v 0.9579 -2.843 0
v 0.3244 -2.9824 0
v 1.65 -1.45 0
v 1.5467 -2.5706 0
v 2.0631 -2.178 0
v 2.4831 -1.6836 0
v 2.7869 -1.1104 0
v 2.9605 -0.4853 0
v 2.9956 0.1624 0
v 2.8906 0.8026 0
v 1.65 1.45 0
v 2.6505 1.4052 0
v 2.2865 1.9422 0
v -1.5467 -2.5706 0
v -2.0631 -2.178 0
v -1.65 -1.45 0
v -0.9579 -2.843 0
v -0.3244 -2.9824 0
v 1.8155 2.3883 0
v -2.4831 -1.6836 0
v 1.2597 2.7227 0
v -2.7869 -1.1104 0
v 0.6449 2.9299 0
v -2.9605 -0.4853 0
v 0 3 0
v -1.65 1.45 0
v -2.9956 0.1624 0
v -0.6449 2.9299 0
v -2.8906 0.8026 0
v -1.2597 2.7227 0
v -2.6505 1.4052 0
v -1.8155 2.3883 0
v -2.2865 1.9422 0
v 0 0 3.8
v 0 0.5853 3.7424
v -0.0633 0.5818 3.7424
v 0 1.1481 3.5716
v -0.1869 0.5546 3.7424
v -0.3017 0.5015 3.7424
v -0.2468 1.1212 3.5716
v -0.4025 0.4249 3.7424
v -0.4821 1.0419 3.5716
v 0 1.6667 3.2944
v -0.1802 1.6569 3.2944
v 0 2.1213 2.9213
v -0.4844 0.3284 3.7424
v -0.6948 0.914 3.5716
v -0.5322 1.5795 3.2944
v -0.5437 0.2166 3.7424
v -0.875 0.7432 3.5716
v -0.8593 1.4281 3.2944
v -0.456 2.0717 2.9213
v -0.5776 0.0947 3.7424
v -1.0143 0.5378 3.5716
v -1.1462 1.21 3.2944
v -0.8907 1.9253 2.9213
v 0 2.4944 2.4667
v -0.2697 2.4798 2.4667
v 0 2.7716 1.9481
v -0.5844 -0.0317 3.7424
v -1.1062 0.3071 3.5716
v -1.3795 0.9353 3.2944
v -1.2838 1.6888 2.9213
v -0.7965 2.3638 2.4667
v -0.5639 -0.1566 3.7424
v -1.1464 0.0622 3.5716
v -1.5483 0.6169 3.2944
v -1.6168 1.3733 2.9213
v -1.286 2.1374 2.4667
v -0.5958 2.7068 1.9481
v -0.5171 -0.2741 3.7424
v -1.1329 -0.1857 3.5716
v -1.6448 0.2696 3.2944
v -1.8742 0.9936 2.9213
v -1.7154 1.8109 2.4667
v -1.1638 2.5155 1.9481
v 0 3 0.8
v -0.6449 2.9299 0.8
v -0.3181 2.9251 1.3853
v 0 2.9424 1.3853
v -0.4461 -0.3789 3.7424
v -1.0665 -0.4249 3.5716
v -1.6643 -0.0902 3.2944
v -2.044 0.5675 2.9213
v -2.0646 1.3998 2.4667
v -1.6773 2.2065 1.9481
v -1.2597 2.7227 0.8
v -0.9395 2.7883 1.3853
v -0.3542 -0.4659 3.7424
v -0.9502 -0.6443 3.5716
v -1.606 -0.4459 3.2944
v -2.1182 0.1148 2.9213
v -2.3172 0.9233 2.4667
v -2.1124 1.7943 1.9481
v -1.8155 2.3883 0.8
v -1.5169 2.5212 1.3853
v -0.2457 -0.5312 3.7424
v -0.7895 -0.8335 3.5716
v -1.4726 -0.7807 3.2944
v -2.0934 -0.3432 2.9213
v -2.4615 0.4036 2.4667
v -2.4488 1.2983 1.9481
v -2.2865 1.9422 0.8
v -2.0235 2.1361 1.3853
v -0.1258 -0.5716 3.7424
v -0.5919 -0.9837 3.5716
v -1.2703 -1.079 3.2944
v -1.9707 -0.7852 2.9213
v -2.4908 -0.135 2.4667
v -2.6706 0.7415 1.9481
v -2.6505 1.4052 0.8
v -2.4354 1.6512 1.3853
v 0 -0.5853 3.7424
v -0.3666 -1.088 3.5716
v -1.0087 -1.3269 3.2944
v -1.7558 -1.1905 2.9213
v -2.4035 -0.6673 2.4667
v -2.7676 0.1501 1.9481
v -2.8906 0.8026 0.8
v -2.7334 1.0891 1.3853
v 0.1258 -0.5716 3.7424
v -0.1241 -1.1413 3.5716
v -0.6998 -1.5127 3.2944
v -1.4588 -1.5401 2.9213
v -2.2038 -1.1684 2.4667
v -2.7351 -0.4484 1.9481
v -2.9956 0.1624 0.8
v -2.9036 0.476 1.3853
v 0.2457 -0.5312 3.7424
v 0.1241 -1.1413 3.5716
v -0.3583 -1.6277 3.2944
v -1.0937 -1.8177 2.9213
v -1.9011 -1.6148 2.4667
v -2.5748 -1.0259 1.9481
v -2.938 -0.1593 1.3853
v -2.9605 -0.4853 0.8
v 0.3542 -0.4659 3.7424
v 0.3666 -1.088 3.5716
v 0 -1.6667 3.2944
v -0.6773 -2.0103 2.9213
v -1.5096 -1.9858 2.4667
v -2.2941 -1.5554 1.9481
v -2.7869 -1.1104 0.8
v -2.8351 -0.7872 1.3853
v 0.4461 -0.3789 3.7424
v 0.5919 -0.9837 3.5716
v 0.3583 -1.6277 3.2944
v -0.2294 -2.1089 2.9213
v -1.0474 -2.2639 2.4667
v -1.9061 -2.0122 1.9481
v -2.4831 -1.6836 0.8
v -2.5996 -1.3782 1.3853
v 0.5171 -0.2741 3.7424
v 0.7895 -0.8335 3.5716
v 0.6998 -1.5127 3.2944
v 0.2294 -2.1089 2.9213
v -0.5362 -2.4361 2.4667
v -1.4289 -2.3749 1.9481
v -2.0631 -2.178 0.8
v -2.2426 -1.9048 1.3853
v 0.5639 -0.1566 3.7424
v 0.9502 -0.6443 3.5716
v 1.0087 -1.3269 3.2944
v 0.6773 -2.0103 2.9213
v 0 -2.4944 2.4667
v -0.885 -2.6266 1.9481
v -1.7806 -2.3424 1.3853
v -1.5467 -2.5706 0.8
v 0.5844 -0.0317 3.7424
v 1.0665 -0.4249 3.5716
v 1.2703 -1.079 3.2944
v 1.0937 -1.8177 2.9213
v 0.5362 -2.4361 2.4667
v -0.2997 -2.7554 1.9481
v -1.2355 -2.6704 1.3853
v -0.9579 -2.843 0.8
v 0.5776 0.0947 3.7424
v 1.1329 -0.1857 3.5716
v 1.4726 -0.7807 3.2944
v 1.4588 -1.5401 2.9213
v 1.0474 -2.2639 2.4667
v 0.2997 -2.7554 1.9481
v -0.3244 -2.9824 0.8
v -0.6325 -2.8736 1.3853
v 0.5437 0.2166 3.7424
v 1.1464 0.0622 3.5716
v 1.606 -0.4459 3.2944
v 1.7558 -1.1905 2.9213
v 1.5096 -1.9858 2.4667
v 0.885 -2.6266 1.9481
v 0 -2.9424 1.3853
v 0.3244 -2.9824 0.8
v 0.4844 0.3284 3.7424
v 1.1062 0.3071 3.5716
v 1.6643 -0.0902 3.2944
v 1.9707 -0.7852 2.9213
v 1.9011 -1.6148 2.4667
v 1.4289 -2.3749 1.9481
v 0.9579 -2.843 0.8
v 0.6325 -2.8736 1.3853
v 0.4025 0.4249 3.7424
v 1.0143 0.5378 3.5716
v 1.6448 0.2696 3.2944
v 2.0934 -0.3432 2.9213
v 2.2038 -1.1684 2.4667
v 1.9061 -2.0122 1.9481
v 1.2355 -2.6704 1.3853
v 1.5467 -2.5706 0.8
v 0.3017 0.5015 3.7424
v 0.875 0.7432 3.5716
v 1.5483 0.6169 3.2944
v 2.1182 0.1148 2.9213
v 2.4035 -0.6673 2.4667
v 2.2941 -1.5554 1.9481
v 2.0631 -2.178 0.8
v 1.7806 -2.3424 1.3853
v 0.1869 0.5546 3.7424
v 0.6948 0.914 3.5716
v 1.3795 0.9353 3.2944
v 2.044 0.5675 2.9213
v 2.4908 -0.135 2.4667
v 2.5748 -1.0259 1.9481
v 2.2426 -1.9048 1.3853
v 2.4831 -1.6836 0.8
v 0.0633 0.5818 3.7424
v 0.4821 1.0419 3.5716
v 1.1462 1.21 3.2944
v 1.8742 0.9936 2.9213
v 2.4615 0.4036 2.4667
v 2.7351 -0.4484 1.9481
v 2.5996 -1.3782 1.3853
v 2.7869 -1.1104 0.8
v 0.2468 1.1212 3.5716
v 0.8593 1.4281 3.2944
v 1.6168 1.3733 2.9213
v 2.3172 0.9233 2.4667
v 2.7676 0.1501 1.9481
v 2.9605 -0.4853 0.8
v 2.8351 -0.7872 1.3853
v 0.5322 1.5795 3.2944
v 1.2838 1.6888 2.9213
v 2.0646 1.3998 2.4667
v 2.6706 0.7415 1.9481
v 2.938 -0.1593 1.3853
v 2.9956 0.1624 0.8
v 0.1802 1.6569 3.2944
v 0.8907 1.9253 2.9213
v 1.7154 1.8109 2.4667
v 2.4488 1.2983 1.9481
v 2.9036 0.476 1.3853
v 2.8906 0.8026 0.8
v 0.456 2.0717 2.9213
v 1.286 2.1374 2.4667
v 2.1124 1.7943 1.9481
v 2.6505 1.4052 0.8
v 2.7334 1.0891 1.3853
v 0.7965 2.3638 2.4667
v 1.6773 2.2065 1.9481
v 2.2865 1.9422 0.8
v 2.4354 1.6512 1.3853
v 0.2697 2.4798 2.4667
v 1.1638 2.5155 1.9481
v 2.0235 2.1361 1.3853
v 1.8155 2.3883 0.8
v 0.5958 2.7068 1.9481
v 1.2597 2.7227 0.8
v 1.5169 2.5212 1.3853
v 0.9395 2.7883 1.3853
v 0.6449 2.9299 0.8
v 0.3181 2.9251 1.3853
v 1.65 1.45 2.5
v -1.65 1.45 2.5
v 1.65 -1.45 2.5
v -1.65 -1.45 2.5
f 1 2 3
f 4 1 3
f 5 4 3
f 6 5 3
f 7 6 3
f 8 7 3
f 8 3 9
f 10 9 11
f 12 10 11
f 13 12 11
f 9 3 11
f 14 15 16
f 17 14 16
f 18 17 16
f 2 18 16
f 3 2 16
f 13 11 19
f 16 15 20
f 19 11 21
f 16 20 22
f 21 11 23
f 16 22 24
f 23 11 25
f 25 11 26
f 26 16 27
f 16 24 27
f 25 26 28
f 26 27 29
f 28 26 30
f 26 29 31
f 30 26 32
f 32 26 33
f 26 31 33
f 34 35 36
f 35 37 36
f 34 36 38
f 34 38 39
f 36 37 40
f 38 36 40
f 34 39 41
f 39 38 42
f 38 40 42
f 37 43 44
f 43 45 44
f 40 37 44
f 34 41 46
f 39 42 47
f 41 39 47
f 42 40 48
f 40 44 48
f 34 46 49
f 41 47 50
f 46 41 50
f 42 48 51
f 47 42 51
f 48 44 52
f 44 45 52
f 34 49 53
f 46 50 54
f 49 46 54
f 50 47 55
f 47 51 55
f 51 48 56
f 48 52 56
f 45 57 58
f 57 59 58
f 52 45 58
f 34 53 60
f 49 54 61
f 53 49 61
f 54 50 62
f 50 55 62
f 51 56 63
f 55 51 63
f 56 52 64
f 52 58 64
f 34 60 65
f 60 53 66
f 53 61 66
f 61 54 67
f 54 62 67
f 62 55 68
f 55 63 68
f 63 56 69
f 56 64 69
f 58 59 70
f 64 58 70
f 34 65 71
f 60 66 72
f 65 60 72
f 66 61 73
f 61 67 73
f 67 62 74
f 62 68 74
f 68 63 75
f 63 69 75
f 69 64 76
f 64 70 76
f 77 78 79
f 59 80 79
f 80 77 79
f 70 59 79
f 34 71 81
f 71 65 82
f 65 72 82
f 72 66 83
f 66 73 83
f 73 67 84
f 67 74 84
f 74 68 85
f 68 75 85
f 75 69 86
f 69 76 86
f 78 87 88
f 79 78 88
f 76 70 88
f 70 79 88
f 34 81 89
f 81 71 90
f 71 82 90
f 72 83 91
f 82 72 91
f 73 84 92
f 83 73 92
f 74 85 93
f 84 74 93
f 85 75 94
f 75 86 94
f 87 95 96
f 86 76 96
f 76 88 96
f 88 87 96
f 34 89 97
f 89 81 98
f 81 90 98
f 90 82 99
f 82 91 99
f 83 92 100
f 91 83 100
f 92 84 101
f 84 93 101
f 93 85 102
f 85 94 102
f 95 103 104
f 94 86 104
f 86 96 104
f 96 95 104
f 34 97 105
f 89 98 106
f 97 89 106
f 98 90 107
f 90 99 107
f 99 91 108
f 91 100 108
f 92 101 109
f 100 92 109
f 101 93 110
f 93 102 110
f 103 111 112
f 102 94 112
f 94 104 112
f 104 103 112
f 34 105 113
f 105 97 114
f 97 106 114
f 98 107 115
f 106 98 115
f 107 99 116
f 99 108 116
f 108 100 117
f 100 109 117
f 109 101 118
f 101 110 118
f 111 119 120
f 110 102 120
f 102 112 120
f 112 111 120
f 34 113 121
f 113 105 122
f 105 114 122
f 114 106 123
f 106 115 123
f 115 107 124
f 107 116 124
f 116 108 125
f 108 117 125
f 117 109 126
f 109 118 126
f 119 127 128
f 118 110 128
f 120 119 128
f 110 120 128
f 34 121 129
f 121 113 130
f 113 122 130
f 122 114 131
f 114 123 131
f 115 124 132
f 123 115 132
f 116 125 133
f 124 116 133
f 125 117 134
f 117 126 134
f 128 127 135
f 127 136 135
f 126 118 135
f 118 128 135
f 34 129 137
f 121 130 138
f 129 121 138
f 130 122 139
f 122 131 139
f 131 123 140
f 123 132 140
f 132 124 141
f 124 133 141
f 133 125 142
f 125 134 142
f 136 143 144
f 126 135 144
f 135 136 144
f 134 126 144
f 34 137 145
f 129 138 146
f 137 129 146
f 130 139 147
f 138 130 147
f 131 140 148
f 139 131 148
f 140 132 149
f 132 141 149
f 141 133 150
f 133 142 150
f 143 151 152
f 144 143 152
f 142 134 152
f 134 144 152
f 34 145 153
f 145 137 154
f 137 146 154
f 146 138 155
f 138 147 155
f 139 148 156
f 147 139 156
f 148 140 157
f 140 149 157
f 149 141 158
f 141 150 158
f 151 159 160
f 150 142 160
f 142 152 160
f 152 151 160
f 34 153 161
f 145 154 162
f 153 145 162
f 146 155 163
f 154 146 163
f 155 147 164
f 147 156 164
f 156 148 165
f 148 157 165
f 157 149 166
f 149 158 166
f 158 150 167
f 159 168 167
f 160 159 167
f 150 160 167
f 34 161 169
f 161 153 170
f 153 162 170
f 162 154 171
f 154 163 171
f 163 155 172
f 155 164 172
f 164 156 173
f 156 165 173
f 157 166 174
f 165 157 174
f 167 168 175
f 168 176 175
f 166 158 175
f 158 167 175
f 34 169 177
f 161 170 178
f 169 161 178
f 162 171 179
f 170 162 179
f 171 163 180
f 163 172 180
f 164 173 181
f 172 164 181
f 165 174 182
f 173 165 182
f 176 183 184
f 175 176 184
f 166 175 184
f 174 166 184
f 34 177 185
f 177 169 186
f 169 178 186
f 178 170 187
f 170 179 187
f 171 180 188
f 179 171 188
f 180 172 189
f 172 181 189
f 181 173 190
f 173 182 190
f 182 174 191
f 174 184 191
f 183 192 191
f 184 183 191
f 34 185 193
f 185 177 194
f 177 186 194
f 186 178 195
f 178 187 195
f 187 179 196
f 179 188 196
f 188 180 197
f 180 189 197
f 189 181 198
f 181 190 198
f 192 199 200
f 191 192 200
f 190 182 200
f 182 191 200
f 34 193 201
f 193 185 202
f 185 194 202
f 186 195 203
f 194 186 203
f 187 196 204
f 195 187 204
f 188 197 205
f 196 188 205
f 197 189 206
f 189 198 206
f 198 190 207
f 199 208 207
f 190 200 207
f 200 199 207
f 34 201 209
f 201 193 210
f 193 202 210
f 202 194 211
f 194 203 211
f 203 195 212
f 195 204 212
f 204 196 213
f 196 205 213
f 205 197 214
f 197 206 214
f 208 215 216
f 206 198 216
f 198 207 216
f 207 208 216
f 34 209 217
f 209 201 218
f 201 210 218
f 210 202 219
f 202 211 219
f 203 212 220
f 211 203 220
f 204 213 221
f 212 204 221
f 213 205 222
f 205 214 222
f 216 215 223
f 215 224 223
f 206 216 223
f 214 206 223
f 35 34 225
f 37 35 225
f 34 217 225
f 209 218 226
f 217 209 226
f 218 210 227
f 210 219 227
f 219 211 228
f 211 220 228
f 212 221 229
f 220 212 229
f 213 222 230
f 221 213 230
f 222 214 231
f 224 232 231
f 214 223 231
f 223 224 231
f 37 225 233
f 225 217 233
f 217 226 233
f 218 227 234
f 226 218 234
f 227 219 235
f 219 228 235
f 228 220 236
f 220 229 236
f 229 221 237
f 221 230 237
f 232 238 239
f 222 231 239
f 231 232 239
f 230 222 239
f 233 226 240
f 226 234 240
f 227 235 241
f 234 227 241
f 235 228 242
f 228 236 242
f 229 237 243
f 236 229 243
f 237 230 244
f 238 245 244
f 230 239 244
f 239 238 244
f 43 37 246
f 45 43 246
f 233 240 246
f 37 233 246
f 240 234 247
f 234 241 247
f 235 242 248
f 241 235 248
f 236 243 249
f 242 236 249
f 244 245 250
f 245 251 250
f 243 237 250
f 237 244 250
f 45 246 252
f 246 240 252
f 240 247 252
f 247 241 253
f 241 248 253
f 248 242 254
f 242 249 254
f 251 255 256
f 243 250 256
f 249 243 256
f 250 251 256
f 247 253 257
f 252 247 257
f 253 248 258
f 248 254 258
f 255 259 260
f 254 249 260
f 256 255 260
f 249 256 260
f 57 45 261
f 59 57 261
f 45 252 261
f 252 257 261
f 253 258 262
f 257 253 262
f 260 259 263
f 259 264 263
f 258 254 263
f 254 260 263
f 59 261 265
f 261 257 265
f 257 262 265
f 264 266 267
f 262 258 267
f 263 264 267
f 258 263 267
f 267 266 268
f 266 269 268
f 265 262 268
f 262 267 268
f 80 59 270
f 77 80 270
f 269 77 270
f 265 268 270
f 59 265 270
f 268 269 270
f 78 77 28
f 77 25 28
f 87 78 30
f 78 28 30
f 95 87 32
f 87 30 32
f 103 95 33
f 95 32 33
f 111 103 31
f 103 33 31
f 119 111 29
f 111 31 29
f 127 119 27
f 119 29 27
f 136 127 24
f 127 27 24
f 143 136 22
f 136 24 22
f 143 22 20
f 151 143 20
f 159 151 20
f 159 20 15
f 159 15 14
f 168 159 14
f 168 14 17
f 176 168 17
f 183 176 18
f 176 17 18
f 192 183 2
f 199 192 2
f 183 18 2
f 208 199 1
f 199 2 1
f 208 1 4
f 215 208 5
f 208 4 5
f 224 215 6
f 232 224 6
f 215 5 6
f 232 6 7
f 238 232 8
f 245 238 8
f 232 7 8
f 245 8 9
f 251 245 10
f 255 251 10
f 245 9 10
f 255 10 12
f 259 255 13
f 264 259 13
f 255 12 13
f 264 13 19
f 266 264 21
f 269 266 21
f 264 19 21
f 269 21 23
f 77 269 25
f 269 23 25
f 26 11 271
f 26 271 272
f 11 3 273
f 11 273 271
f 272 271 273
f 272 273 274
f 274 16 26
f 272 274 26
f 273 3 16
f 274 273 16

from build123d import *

# Parameters (mm, degrees)
SKIZZE3_W                       = 3.3
SKIZZE3_H                       = 2.9
SCHNITT_LINEAR_AUSTRAGEN1_DEPTH = 2.5


with BuildPart() as part:
    # Skizze2 → Rotation2 (revolve)
    with BuildSketch(Plane(origin=(0, 0, 0), x_dir=(0, 0, -1), z_dir=(1, 0, 0))):
        with BuildLine():
            Line((-0.8, 3), (0, 3))
            Line((0, 3), (0, 0))
            Line((0, 0), (-3.8, 0))
            ThreePointArc((-3.8, 0), (-2.921320344, 2.121320344), (-0.8, 3))
        make_face()
    revolve(axis=Axis((0, 0, 0.8), (0, 0, 1)))

    # Skizze3 → Schnitt-Linear austragen1 (cut)
    with BuildSketch(Plane(origin=(0, 0, 0), x_dir=(-1, 0, 0), z_dir=(0, 0, -1))):
        Rectangle(SKIZZE3_W, SKIZZE3_H)
    extrude(amount=-SCHNITT_LINEAR_AUSTRAGEN1_DEPTH, mode=Mode.SUBTRACT)


solid = part.part
